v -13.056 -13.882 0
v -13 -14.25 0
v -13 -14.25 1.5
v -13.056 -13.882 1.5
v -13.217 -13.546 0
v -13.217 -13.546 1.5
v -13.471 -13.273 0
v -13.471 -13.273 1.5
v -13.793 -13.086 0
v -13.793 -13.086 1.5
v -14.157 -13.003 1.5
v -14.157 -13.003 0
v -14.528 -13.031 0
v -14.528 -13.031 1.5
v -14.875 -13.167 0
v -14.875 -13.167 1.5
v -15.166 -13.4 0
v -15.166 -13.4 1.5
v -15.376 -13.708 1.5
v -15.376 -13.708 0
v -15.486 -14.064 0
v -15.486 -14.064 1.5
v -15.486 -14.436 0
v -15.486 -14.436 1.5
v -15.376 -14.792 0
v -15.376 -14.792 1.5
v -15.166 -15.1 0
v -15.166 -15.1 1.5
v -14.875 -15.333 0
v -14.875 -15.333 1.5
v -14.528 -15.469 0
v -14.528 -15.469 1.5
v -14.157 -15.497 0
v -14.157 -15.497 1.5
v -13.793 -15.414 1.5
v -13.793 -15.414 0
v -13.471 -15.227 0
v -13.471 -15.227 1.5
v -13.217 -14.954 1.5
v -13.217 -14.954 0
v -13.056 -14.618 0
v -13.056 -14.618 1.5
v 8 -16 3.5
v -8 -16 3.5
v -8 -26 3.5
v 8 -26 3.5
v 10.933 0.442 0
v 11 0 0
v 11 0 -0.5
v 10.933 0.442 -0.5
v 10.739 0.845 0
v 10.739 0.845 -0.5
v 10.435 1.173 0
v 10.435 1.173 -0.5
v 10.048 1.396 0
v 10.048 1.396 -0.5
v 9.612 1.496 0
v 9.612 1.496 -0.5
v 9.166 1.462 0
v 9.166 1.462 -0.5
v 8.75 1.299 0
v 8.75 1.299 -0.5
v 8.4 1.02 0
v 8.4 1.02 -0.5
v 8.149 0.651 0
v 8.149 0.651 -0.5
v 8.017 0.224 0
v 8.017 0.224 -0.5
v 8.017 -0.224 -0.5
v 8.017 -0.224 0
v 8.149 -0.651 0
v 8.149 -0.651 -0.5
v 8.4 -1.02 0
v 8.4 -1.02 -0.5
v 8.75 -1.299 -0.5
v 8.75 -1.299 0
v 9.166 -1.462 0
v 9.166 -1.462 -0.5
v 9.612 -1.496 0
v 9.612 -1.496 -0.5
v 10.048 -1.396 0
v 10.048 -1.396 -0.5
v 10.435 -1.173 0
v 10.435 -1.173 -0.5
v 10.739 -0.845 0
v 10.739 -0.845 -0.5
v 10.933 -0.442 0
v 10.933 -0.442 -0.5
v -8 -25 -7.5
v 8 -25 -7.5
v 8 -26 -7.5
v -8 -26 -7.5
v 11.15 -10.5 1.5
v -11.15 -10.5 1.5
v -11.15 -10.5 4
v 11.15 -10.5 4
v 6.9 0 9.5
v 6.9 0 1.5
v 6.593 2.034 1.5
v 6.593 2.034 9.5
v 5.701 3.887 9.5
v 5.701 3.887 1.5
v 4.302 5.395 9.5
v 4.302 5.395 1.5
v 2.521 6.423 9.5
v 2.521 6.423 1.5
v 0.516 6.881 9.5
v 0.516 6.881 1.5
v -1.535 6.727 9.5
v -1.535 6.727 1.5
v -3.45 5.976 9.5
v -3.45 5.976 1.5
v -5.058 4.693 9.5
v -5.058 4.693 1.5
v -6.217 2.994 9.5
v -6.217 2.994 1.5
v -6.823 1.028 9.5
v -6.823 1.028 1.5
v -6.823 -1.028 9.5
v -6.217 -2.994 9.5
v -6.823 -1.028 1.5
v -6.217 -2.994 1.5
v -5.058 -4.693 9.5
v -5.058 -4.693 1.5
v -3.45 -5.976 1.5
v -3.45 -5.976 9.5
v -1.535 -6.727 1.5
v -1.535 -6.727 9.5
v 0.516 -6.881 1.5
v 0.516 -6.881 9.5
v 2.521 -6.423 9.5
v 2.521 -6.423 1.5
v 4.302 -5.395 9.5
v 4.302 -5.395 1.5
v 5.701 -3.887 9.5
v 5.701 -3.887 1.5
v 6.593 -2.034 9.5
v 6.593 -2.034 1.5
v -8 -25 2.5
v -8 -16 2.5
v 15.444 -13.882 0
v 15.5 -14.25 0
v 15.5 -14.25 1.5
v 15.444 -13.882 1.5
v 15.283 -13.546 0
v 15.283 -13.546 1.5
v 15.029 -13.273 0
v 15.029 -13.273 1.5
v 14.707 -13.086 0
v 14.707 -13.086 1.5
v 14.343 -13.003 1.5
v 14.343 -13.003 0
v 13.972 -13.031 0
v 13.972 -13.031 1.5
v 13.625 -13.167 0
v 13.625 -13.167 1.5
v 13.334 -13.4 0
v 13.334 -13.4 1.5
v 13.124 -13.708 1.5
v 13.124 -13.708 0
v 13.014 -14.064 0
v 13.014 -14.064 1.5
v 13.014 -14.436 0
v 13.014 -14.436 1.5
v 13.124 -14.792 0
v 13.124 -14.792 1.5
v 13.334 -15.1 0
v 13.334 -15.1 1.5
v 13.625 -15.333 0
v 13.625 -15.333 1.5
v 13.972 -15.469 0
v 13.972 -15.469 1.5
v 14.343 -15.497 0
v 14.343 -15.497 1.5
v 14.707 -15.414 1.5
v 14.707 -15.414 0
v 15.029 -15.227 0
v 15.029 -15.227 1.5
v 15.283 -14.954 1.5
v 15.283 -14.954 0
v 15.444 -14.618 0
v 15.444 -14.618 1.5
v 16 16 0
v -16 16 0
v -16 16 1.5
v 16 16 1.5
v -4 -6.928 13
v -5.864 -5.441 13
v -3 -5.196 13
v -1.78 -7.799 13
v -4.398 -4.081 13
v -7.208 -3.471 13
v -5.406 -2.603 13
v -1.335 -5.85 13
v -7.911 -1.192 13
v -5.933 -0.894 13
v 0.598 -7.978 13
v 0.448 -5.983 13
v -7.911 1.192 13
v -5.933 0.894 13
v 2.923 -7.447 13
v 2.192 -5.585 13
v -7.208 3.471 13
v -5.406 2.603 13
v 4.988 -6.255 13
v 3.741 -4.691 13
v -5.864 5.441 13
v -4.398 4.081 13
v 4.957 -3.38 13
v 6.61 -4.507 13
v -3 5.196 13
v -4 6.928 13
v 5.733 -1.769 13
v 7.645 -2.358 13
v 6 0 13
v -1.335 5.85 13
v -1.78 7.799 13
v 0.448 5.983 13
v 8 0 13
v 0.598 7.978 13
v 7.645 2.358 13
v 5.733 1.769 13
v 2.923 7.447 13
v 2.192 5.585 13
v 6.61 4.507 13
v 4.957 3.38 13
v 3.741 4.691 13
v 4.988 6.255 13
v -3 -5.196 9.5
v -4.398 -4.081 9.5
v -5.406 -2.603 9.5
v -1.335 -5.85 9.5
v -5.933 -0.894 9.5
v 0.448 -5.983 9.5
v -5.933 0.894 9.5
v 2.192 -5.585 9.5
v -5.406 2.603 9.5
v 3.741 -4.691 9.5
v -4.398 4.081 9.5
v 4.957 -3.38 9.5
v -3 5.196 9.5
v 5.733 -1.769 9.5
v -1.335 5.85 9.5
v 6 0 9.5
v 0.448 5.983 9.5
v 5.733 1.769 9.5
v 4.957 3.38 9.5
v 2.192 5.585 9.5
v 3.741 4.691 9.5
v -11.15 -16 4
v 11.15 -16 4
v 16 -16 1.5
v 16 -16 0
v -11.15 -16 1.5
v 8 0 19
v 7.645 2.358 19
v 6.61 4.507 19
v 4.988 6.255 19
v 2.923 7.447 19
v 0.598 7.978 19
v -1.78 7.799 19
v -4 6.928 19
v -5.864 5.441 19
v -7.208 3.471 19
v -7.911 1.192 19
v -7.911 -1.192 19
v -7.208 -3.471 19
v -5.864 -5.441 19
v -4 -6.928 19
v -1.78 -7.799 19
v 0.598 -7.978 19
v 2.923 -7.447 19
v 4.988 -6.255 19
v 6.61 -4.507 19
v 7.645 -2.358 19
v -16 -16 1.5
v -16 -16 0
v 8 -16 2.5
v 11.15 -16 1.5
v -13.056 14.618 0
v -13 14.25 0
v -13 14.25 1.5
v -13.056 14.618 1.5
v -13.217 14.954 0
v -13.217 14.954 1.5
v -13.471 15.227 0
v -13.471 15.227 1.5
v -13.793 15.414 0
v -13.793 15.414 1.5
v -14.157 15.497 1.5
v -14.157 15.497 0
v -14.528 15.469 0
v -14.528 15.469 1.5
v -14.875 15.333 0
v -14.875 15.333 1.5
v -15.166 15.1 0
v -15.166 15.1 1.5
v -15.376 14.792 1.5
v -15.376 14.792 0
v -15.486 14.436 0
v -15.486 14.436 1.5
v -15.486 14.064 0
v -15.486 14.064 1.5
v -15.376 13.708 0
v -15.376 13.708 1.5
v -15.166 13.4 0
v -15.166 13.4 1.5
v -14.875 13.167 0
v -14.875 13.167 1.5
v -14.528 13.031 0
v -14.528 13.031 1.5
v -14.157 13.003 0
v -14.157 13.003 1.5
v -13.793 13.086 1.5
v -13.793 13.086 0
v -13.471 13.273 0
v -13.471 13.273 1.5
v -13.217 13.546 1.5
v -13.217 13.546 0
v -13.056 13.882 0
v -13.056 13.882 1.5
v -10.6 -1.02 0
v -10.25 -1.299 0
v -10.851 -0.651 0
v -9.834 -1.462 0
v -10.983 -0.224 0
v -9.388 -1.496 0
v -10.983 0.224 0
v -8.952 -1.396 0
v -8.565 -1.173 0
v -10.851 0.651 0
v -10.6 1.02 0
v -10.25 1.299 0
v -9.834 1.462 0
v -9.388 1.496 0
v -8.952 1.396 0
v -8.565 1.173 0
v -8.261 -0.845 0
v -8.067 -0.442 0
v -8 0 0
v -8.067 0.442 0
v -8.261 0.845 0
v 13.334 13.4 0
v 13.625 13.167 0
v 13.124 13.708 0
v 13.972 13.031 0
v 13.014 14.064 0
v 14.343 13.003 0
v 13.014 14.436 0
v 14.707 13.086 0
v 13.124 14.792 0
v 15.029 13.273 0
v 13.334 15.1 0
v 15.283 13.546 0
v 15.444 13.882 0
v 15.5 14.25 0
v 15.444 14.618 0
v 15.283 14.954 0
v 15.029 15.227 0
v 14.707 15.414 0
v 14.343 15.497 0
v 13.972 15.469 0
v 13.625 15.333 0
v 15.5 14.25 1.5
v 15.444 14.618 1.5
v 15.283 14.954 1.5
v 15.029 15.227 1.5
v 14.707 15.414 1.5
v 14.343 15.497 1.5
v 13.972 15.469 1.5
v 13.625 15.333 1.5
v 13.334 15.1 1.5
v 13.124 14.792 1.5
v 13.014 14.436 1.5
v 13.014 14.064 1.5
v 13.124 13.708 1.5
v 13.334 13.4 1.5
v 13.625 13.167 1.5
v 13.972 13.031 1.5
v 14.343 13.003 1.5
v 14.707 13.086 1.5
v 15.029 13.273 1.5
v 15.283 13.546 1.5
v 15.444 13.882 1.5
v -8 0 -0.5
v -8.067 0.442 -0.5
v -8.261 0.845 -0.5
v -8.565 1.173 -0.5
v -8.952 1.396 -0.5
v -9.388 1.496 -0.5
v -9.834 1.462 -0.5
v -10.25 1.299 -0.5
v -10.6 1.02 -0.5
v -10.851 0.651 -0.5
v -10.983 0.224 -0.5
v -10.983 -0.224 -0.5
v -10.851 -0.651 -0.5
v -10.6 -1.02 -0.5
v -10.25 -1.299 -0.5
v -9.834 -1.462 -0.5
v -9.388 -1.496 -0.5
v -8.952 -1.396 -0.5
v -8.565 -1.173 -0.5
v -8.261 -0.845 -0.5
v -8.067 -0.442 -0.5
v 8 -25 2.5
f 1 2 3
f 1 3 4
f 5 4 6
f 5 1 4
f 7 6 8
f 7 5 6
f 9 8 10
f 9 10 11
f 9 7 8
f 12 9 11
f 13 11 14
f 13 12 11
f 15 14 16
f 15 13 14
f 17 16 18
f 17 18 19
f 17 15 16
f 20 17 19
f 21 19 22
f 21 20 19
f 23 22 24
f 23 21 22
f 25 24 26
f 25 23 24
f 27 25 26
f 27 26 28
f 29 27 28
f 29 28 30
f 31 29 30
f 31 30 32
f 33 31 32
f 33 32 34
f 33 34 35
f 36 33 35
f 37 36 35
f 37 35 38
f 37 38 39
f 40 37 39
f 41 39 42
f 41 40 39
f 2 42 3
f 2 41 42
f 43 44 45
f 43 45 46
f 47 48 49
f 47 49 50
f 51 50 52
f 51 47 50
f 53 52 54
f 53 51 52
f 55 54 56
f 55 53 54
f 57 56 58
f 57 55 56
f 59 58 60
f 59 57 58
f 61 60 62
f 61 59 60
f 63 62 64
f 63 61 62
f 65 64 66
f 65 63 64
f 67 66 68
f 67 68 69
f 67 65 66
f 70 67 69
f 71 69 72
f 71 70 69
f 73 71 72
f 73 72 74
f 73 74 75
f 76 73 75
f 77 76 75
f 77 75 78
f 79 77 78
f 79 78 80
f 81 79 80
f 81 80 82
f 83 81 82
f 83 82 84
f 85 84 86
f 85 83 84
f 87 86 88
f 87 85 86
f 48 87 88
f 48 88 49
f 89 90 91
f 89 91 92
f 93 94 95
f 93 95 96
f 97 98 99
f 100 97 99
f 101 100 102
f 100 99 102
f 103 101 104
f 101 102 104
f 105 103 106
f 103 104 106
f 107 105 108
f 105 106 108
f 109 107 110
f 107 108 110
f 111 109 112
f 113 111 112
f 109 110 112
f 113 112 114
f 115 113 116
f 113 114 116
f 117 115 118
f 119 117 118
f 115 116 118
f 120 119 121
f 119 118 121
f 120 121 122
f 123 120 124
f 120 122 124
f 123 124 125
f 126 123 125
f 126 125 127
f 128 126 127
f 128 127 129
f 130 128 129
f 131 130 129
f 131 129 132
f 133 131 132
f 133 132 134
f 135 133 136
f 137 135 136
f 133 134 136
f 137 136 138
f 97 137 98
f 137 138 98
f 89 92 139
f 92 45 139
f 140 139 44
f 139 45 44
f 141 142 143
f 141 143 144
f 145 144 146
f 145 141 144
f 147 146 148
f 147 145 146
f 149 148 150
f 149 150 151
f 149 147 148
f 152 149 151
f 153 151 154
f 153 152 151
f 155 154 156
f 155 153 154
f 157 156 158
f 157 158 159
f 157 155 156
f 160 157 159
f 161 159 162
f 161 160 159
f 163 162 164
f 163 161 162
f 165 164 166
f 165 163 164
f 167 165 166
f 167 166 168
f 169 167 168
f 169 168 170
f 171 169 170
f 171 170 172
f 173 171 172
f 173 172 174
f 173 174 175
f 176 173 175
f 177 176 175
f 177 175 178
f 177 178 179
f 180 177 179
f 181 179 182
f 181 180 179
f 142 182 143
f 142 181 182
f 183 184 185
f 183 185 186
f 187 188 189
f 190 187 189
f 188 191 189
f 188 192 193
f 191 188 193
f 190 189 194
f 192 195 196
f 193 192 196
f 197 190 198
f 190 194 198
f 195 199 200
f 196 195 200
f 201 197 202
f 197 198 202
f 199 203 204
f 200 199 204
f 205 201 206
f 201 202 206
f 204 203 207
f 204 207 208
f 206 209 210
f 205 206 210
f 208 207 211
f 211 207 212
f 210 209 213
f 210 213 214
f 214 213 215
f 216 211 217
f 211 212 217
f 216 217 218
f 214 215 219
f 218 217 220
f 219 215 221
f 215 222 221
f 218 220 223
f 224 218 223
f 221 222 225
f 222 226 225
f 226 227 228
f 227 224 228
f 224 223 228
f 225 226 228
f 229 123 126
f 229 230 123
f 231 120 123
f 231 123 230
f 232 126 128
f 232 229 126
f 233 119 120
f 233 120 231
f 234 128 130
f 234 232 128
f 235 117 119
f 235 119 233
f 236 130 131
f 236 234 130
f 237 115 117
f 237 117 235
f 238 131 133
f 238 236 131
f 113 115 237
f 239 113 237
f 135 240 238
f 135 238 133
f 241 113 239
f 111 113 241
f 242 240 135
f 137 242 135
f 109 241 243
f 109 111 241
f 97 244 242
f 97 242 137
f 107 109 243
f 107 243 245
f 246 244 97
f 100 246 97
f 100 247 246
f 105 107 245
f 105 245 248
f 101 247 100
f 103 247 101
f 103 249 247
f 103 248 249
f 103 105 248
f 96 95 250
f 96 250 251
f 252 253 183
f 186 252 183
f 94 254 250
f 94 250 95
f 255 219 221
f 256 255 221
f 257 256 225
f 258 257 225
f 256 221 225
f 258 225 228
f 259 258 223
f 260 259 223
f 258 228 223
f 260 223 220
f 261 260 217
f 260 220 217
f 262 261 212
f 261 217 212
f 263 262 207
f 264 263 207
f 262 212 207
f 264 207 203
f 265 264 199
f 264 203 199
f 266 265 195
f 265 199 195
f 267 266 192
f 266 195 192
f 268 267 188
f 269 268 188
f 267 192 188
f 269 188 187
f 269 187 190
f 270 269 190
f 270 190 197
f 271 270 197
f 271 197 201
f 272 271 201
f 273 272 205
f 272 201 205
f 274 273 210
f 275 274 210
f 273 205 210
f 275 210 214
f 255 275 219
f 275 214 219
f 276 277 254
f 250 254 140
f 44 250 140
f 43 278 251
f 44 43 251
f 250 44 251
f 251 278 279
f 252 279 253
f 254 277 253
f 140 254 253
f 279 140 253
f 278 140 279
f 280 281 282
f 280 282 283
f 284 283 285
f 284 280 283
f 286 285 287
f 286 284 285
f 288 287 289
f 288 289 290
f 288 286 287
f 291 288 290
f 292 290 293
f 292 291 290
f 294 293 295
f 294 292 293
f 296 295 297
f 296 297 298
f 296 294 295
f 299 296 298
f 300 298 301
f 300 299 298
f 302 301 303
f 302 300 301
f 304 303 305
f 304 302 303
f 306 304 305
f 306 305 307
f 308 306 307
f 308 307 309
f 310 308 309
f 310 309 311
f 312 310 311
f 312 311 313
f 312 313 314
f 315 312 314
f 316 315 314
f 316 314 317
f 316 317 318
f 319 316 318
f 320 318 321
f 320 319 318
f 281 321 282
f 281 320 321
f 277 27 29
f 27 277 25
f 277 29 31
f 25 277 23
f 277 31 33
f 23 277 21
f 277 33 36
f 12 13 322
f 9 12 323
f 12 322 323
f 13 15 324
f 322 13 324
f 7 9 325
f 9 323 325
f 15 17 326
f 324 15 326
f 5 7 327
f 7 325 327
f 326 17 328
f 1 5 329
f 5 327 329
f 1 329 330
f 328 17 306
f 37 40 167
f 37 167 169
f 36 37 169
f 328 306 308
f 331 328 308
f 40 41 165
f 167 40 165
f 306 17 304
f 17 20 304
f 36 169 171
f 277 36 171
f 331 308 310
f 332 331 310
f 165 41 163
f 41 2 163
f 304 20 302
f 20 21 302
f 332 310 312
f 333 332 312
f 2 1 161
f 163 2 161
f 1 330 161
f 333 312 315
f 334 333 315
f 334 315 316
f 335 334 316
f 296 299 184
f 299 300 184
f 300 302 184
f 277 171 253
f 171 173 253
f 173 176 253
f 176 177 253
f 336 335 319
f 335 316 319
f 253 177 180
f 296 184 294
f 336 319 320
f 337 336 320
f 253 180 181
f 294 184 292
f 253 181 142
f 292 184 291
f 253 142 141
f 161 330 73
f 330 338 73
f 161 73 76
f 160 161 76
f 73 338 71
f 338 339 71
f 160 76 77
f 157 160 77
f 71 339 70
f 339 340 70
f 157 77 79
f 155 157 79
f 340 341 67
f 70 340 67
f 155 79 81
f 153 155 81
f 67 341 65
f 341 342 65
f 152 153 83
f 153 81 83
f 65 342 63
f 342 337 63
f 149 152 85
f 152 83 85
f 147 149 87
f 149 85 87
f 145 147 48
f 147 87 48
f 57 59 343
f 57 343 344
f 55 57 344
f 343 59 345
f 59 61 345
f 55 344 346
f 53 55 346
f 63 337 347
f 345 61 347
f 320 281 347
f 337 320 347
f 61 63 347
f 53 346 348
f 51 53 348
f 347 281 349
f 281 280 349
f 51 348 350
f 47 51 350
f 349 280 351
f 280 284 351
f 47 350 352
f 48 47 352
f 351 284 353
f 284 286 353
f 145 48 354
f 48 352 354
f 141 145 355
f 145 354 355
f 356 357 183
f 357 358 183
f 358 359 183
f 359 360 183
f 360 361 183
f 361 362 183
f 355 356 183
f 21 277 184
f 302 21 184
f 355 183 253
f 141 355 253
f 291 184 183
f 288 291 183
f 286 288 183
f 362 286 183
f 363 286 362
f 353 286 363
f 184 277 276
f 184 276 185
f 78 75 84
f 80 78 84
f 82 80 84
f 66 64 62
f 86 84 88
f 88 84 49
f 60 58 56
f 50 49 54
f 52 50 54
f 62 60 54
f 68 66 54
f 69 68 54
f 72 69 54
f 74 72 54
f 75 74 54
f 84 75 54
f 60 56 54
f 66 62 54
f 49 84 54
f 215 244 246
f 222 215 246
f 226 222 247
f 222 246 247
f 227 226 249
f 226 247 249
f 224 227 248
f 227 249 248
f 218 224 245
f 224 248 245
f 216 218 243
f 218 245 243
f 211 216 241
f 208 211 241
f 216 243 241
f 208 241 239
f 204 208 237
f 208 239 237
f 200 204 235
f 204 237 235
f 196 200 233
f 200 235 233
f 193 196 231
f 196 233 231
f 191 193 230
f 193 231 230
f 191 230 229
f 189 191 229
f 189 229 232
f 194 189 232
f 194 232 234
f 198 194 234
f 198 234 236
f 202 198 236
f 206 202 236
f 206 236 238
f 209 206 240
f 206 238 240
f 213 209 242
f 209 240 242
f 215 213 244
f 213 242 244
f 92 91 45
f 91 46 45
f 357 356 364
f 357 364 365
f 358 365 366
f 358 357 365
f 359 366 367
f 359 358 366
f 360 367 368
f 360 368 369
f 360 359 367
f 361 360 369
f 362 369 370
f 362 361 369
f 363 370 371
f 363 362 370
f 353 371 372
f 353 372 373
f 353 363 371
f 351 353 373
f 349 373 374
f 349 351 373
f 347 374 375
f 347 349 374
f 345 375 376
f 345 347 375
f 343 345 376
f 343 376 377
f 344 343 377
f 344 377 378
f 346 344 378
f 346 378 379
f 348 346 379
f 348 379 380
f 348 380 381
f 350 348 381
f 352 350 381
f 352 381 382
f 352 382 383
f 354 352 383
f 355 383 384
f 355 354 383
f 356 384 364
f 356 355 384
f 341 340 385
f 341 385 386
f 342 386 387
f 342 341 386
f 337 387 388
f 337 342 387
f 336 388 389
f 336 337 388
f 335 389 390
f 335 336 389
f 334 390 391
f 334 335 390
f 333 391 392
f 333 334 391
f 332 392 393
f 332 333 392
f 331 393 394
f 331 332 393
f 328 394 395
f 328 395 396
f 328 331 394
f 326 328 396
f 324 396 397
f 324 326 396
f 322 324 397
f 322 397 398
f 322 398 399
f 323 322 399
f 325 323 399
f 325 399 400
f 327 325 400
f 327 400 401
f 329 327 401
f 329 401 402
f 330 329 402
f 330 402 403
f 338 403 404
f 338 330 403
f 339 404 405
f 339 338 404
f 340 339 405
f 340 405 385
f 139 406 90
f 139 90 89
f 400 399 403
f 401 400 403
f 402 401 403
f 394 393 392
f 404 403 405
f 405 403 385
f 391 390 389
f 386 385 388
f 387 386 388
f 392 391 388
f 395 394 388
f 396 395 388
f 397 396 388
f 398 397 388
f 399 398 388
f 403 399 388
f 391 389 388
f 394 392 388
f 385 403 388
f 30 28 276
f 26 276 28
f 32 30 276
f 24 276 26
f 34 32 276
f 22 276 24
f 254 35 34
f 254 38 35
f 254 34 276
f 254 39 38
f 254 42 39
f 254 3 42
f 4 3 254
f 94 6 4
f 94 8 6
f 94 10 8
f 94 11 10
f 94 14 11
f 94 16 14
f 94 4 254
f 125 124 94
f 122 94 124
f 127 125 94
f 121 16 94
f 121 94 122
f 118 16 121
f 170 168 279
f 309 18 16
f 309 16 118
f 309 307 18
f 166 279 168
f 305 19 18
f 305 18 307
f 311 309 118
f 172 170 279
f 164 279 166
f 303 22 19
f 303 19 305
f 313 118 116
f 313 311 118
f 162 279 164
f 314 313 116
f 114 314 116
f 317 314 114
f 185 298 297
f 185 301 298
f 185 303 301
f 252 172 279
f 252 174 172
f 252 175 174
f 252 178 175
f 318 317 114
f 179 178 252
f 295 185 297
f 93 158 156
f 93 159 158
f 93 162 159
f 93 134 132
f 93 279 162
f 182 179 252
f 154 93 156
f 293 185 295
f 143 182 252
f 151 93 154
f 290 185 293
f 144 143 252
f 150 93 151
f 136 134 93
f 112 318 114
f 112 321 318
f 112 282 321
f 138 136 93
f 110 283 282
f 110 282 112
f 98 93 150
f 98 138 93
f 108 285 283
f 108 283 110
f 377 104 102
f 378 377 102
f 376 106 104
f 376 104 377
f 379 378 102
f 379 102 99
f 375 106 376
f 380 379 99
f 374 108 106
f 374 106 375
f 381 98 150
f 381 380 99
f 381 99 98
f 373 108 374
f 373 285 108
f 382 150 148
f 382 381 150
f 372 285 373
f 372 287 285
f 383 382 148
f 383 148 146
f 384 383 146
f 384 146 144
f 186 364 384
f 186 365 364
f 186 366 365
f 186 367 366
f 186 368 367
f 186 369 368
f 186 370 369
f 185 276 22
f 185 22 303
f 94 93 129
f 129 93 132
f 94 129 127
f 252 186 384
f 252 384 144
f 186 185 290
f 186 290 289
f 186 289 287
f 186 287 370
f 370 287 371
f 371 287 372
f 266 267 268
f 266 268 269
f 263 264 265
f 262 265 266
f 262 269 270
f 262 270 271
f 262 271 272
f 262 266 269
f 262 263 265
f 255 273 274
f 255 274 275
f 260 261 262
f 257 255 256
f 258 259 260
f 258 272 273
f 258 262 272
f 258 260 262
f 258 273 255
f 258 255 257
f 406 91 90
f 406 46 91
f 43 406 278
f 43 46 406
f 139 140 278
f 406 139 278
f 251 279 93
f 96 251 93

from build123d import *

# Parameters (mm, degrees)
SKETCH_1_W         = 32
SKETCH_1_H         = 32
SKETCH_1_R         = 1.25
EXTRUDE_1472_DEPTH = 1.5
EXTRUDE_START      = 1.5
SKETCH_1_3_W       = 22.3
SKETCH_1_3_H       = 5.5
EXTRUDE_1647_DEPTH = 2.5
SKETCH_1_4_R       = 6.9
SKETCH_1_4_R_2     = 6
EXTRUDE_1817_DEPTH = 8
EXTRUDE_START_2    = 9.5
SKETCH_1_5_R       = 6
EXTRUDE_1989_DEPTH = 3.5
EXTRUDE_START_3    = 13
SKETCH_1_6_R       = 8
SKETCH_1_6_R_2     = 6.9
SKETCH_1_6_R_3     = 6
EXTRUDE_2083_DEPTH = 6
SKETCH_1_7_R       = 1.5
EXTRUDE_2264_DEPTH = 0.5
SKETCH_2_W         = 16
SKETCH_2_H         = 1
EXTRUDE_2724_DEPTH = 10
SKETCH_3_W         = 16
SKETCH_3_H         = 1
EXTRUDE_3021_DEPTH = 10


with BuildPart() as part:
    # Эскиз1 → Extrude 1472 (new body)
    with BuildSketch(Plane.XY):
        Rectangle(SKETCH_1_W, SKETCH_1_H)
        with Locations((-14.25, -14.25)):
            Circle(SKETCH_1_R, mode=Mode.SUBTRACT)
        with Locations((14.25, -14.25)):
            Circle(SKETCH_1_R, mode=Mode.SUBTRACT)
        with Locations((-14.25, 14.25)):
            Circle(SKETCH_1_R, mode=Mode.SUBTRACT)
        with Locations((14.25, 14.25)):
            Circle(SKETCH_1_R, mode=Mode.SUBTRACT)
    extrude(amount=EXTRUDE_1472_DEPTH)

    # Эскиз1<3> → Extrude 1647 (add)
    with BuildSketch(Plane.XY.offset(EXTRUDE_START)):
        with Locations((0, -13.25)):
            Rectangle(SKETCH_1_3_W, SKETCH_1_3_H)
    extrude(amount=EXTRUDE_1647_DEPTH)

    # Эскиз1<4> → Extrude 1817 (add)
    with BuildSketch(Plane.XY.offset(EXTRUDE_START)):
        Circle(SKETCH_1_4_R)
        Circle(SKETCH_1_4_R_2, mode=Mode.SUBTRACT)
        Circle(SKETCH_1_4_R_2)
    extrude(amount=EXTRUDE_1817_DEPTH)

    # Эскиз1<5> → Extrude 1989 (add)
    with BuildSketch(Plane.XY.offset(EXTRUDE_START_2)):
        Circle(SKETCH_1_5_R)
    extrude(amount=EXTRUDE_1989_DEPTH)

    # Эскиз1<6> → Extrude 2083 (add)
    with BuildSketch(Plane.XY.offset(EXTRUDE_START_3)):
        Circle(SKETCH_1_6_R)
        Circle(SKETCH_1_6_R_2, mode=Mode.SUBTRACT)
        Circle(SKETCH_1_6_R_2)
        Circle(SKETCH_1_6_R_3, mode=Mode.SUBTRACT)
        Circle(SKETCH_1_6_R_3)
    extrude(amount=EXTRUDE_2083_DEPTH)

    # Эскиз1<7> → Extrude 2264 (add)
    with BuildSketch(Plane.XY):
        with Locations((9.5, 0)):
            Circle(SKETCH_1_7_R)
        with Locations((-9.5, 0)):
            Circle(SKETCH_1_7_R)
    extrude(amount=-EXTRUDE_2264_DEPTH)

    # Эскиз2 → Extrude 2724 (add)
    with BuildSketch(Plane.XZ.offset(16)):
        with Locations((0, 3)):
            Rectangle(SKETCH_2_W, SKETCH_2_H)
    extrude(amount=EXTRUDE_2724_DEPTH)

    # Эскиз3 → Extrude 3021 (add)
    with BuildSketch(Plane(origin=(0, 0, 2.5), x_dir=(-1, 0, 0), z_dir=(0, 0, -1))):
        with Locations((0, -25.5)):
            Rectangle(SKETCH_3_W, SKETCH_3_H)
    extrude(amount=EXTRUDE_3021_DEPTH)


solid = part.part
